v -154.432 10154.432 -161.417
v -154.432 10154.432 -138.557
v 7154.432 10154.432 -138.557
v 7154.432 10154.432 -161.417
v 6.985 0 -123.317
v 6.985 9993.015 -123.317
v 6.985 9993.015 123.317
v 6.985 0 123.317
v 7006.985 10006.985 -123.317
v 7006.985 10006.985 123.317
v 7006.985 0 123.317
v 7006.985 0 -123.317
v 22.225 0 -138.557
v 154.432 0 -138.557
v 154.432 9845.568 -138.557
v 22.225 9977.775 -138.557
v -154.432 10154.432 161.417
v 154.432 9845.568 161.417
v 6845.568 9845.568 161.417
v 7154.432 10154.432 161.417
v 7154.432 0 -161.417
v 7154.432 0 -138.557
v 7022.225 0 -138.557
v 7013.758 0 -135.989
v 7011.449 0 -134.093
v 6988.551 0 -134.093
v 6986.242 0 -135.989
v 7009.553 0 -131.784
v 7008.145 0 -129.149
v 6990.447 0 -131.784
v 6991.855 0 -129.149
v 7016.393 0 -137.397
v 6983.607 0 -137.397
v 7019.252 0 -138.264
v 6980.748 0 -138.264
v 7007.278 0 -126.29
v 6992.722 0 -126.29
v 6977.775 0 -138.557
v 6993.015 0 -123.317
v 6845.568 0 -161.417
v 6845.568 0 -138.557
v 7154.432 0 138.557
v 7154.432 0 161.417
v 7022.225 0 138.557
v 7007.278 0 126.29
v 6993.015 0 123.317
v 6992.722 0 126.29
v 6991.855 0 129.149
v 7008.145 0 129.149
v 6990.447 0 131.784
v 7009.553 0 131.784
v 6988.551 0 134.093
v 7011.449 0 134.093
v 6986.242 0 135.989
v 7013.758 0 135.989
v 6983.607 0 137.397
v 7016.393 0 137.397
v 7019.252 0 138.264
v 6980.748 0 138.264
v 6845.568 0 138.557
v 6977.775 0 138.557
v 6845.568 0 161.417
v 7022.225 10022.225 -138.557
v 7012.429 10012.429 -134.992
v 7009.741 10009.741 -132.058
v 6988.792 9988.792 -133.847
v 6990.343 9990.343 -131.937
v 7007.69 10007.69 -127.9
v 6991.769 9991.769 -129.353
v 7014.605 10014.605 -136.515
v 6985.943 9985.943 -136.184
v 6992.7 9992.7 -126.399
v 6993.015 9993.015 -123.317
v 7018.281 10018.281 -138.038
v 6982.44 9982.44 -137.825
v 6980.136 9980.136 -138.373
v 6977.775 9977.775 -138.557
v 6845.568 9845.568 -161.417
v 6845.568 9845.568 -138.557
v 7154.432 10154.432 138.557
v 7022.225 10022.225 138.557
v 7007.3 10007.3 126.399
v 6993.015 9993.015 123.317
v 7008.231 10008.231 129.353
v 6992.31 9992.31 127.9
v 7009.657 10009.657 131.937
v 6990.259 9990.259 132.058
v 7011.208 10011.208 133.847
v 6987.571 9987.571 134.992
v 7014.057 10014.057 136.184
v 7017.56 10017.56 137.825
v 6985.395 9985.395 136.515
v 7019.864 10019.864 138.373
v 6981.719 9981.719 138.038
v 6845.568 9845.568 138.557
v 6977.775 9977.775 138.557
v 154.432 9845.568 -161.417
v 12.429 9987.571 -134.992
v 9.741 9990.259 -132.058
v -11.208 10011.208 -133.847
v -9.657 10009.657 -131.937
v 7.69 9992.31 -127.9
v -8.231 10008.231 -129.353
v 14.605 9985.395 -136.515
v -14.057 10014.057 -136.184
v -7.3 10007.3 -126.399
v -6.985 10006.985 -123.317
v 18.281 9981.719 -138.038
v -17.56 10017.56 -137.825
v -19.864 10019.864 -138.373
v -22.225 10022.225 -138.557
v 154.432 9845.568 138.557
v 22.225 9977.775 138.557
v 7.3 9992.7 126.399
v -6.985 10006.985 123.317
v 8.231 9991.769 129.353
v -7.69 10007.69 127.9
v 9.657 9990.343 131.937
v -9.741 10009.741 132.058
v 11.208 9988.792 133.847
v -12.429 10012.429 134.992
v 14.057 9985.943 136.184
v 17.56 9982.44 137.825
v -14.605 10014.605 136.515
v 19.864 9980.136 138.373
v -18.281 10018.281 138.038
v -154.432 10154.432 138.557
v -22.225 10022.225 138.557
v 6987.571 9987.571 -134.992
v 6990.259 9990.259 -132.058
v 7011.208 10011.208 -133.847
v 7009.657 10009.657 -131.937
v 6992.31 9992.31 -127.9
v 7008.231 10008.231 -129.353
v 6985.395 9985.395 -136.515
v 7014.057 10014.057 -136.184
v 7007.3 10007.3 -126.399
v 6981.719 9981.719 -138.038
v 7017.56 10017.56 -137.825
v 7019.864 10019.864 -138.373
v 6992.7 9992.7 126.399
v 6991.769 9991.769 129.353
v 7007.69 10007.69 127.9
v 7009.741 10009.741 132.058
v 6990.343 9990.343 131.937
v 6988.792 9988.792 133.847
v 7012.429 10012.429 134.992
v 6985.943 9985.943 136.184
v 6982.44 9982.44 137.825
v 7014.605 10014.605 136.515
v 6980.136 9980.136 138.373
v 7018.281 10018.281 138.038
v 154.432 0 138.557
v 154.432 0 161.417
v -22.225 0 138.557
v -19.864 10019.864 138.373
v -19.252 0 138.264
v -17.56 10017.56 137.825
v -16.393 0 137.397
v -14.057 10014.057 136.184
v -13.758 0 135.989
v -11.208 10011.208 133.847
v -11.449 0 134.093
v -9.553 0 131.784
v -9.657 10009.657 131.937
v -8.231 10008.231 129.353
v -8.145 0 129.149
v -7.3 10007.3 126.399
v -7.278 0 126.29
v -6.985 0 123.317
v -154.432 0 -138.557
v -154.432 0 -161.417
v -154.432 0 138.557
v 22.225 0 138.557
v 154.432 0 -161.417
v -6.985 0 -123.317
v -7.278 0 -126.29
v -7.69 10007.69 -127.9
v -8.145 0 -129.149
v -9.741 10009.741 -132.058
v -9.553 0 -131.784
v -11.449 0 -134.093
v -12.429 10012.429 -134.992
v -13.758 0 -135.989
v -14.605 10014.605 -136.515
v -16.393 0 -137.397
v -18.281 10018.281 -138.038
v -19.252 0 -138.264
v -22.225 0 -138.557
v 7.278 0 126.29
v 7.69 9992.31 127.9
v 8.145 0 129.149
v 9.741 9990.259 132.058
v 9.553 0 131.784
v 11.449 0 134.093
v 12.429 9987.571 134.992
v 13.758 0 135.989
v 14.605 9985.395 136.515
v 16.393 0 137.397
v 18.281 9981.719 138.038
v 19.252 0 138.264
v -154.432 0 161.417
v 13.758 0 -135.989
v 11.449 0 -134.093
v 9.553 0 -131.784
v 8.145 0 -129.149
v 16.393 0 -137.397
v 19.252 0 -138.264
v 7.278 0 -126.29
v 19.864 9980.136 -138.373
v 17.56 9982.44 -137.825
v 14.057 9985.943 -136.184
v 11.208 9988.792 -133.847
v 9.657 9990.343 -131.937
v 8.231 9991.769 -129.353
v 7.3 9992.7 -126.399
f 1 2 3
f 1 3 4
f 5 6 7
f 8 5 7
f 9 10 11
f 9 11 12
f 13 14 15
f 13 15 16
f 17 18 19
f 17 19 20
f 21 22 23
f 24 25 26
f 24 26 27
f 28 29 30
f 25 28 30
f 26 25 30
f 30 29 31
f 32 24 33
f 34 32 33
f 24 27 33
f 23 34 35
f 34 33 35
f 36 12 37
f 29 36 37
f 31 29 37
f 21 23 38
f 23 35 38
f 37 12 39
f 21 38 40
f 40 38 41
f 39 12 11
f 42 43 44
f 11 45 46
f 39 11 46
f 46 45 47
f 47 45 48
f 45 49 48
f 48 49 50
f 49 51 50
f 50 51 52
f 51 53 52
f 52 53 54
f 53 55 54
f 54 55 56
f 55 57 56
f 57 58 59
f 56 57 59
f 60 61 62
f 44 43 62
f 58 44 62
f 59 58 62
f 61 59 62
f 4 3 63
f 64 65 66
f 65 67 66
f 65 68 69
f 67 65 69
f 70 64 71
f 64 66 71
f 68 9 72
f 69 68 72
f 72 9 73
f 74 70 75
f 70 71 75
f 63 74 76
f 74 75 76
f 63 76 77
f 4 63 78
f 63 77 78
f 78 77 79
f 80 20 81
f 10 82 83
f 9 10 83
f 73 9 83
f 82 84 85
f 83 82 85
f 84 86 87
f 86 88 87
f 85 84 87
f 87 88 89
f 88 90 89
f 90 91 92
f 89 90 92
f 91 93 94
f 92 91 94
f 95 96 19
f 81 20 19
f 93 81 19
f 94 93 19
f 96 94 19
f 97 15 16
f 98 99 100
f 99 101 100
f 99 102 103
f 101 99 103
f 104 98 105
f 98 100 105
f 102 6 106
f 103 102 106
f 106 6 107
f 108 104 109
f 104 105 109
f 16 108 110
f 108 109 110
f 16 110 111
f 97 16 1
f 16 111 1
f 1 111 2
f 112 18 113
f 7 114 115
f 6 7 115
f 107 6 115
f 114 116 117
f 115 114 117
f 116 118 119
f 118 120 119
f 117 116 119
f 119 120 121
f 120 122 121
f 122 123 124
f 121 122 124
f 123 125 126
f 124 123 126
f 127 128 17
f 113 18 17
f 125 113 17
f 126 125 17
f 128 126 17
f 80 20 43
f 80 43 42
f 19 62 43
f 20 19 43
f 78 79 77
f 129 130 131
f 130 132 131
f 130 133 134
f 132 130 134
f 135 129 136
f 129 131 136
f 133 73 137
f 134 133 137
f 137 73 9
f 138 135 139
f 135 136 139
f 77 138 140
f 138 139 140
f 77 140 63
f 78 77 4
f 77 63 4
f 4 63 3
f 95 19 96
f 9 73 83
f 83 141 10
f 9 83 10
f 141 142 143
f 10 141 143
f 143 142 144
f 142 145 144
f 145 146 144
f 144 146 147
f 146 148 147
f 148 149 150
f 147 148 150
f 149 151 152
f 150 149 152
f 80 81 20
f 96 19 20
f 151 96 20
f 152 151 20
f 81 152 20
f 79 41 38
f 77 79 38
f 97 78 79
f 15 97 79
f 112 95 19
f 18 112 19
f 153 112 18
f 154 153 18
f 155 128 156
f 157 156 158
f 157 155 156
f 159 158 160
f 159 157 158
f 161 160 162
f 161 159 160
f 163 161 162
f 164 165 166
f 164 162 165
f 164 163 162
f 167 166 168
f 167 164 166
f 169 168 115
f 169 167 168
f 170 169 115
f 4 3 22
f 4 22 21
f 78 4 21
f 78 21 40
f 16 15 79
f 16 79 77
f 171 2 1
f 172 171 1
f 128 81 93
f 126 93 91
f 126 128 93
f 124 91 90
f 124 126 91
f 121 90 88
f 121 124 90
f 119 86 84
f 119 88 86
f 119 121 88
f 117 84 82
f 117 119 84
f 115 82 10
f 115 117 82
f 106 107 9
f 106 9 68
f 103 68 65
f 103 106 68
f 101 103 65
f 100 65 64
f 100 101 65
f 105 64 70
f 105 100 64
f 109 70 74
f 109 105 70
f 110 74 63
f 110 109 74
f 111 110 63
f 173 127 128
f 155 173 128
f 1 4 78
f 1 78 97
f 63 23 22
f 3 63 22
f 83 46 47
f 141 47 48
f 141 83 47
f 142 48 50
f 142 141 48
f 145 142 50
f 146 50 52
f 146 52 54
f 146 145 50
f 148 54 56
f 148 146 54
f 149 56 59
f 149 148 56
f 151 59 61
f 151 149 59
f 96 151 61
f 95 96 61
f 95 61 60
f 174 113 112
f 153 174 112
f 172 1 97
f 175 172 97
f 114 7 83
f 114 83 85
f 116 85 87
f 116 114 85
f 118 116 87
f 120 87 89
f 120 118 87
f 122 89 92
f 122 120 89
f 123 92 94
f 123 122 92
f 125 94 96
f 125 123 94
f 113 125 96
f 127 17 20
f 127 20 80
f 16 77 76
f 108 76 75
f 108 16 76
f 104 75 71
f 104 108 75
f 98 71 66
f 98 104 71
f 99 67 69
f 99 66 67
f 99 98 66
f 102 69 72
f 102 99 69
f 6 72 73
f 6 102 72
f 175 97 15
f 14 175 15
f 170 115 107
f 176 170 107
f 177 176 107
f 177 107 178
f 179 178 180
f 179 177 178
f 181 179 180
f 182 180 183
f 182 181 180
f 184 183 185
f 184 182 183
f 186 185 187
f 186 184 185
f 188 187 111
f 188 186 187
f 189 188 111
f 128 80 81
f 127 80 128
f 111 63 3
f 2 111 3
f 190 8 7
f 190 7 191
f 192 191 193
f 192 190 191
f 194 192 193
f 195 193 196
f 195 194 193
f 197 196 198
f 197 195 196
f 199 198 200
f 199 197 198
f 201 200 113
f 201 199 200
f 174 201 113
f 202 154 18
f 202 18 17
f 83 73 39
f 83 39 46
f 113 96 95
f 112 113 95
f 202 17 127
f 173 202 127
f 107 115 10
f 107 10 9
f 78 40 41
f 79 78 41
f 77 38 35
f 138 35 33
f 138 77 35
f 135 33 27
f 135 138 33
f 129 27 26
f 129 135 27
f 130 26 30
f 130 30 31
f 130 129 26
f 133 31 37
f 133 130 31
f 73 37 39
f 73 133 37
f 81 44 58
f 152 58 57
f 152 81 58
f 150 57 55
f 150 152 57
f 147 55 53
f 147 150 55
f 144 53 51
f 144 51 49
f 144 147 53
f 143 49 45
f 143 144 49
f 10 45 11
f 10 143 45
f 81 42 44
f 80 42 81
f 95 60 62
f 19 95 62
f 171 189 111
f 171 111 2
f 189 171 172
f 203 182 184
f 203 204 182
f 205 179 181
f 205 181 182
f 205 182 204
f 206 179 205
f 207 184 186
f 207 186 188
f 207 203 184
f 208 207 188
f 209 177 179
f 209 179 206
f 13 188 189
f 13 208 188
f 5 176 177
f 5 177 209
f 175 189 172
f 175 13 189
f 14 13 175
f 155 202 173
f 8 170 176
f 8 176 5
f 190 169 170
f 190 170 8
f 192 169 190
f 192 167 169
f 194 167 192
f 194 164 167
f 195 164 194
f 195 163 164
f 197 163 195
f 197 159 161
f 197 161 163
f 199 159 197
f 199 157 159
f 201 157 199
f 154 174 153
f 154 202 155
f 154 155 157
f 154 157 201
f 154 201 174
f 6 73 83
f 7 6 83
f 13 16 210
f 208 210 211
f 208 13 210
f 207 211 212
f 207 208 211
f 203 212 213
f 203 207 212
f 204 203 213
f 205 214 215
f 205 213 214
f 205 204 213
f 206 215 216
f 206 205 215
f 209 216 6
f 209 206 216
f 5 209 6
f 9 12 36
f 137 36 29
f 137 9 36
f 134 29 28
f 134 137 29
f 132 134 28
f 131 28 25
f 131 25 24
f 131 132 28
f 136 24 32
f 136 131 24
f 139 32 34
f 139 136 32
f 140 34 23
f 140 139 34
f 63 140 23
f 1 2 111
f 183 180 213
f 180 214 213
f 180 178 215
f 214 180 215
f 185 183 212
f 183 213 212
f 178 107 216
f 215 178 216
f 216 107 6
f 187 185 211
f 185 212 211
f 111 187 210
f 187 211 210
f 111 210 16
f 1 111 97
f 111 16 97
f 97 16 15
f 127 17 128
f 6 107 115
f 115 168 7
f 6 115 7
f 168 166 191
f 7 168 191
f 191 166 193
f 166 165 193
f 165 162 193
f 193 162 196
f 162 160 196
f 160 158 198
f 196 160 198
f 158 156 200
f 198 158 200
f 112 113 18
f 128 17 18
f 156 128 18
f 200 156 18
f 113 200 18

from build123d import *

# Parameters (mm, degrees)
W_SECTION_W12X96_1_DEPTH   = 10224.3935776
W_SECTION_W12X96_1_2_DEPTH = 7448.7871552
W_SECTION_W12X96_1_3_DEPTH = 10224.393577601


with BuildPart() as part:
    # Sketch11 → W section W12X96(1) (new body)
    with BuildSketch(Plane(origin=(0, 0, 0), x_dir=(-1, 0, 0), z_dir=(0, 1, 0))):
        with BuildLine():
            Line((-154.432, -161.417), (-154.432, -138.557))
            Line((-154.432, -138.557), (-22.225, -138.557))
            ThreePointArc((-22.225, -138.557), (-11.448692655, -134.093307345), (-6.985, -123.317))
            Line((-6.985, -123.317), (-6.985, 123.317))
            ThreePointArc((-6.985, 123.317), (-11.448692655, 134.093307345), (-22.225, 138.557))
            Line((-22.225, 138.557), (-154.432, 138.557))
            Line((-154.432, 138.557), (-154.432, 161.417))
            Line((-154.432, 161.417), (154.432, 161.417))
            Line((154.432, 161.417), (154.432, 138.557))
            Line((154.432, 138.557), (22.225, 138.557))
            ThreePointArc((22.225, 138.557), (11.448692655, 134.093307345), (6.985, 123.317))
            Line((6.985, 123.317), (6.985, -123.317))
            ThreePointArc((6.985, -123.317), (11.448692655, -134.093307345), (22.225, -138.557))
            Line((22.225, -138.557), (154.432, -138.557))
            Line((154.432, -138.557), (154.432, -161.417))
            Line((154.432, -161.417), (-154.432, -161.417))
        make_face()
    extrude(amount=W_SECTION_W12X96_1_DEPTH)

    # W section W12X96(1) mitre 1
    split(bisect_by=Plane(origin=(0, 10000, 0), x_dir=(0.707106781, -0.707106781, 0), z_dir=(-0.707106781, -0.707106781, 0)), keep=Keep.TOP)


with BuildPart() as body_2:
    # Sketch11 on segment 2 (carried to segment 2) → W section W12X96_1 2 (new body)
    with BuildSketch(Plane(origin=(-224.3935776, 10000, 0), x_dir=(0, 1, 0), z_dir=(1, 0, 0))):
        with BuildLine():
            Line((-154.432, -161.417), (-154.432, -138.557))
            Line((-154.432, -138.557), (-22.225, -138.557))
            ThreePointArc((-22.225, -138.557), (-11.448692655, -134.093307345), (-6.985, -123.317))
            Line((-6.985, -123.317), (-6.985, 123.317))
            ThreePointArc((-6.985, 123.317), (-11.448692655, 134.093307345), (-22.225, 138.557))
            Line((-22.225, 138.557), (-154.432, 138.557))
            Line((-154.432, 138.557), (-154.432, 161.417))
            Line((-154.432, 161.417), (154.432, 161.417))
            Line((154.432, 161.417), (154.432, 138.557))
            Line((154.432, 138.557), (22.225, 138.557))
            ThreePointArc((22.225, 138.557), (11.448692655, 134.093307345), (6.985, 123.317))
            Line((6.985, 123.317), (6.985, -123.317))
            ThreePointArc((6.985, -123.317), (11.448692655, -134.093307345), (22.225, -138.557))
            Line((22.225, -138.557), (154.432, -138.557))
            Line((154.432, -138.557), (154.432, -161.417))
            Line((154.432, -161.417), (-154.432, -161.417))
        make_face()
    extrude(amount=W_SECTION_W12X96_1_2_DEPTH)

    # W section W12X96_1 2 mitre 1
    split(bisect_by=Plane(origin=(0, 10000, 0), x_dir=(-0.707106781, 0.707106781, 0), z_dir=(0.707106781, 0.707106781, 0)), keep=Keep.TOP)

    # W section W12X96_1 2 mitre 2
    split(bisect_by=Plane(origin=(7000, 10000, 0), x_dir=(-0.707106781, -0.707106781, 0), z_dir=(-0.707106781, 0.707106781, 0)), keep=Keep.TOP)


with BuildPart() as body_3:
    # Sketch11 on segment 3 (carried to segment 3) → W section W12X96_1 3 (new body)
    with BuildSketch(Plane(origin=(7000, 10224.3935776, 0), x_dir=(1, 0, 0), z_dir=(0, -1, 0))):
        with BuildLine():
            Line((-154.432, -161.417), (-154.432, -138.557))
            Line((-154.432, -138.557), (-22.225, -138.557))
            ThreePointArc((-22.225, -138.557), (-11.448692655, -134.093307345), (-6.985, -123.317))
            Line((-6.985, -123.317), (-6.985, 123.317))
            ThreePointArc((-6.985, 123.317), (-11.448692655, 134.093307345), (-22.225, 138.557))
            Line((-22.225, 138.557), (-154.432, 138.557))
            Line((-154.432, 138.557), (-154.432, 161.417))
            Line((-154.432, 161.417), (154.432, 161.417))
            Line((154.432, 161.417), (154.432, 138.557))
            Line((154.432, 138.557), (22.225, 138.557))
            ThreePointArc((22.225, 138.557), (11.448692655, 134.093307345), (6.985, 123.317))
            Line((6.985, 123.317), (6.985, -123.317))
            ThreePointArc((6.985, -123.317), (11.448692655, -134.093307345), (22.225, -138.557))
            Line((22.225, -138.557), (154.432, -138.557))
            Line((154.432, -138.557), (154.432, -161.417))
            Line((154.432, -161.417), (-154.432, -161.417))
        make_face()
    extrude(amount=W_SECTION_W12X96_1_3_DEPTH)

    # W section W12X96_1 3 mitre 1
    split(bisect_by=Plane(origin=(7000, 10000, 0), x_dir=(0.707106781, 0.707106781, 0), z_dir=(0.707106781, -0.707106781, 0)), keep=Keep.TOP)


solid = Compound([part.part, body_2.part, body_3.part])
